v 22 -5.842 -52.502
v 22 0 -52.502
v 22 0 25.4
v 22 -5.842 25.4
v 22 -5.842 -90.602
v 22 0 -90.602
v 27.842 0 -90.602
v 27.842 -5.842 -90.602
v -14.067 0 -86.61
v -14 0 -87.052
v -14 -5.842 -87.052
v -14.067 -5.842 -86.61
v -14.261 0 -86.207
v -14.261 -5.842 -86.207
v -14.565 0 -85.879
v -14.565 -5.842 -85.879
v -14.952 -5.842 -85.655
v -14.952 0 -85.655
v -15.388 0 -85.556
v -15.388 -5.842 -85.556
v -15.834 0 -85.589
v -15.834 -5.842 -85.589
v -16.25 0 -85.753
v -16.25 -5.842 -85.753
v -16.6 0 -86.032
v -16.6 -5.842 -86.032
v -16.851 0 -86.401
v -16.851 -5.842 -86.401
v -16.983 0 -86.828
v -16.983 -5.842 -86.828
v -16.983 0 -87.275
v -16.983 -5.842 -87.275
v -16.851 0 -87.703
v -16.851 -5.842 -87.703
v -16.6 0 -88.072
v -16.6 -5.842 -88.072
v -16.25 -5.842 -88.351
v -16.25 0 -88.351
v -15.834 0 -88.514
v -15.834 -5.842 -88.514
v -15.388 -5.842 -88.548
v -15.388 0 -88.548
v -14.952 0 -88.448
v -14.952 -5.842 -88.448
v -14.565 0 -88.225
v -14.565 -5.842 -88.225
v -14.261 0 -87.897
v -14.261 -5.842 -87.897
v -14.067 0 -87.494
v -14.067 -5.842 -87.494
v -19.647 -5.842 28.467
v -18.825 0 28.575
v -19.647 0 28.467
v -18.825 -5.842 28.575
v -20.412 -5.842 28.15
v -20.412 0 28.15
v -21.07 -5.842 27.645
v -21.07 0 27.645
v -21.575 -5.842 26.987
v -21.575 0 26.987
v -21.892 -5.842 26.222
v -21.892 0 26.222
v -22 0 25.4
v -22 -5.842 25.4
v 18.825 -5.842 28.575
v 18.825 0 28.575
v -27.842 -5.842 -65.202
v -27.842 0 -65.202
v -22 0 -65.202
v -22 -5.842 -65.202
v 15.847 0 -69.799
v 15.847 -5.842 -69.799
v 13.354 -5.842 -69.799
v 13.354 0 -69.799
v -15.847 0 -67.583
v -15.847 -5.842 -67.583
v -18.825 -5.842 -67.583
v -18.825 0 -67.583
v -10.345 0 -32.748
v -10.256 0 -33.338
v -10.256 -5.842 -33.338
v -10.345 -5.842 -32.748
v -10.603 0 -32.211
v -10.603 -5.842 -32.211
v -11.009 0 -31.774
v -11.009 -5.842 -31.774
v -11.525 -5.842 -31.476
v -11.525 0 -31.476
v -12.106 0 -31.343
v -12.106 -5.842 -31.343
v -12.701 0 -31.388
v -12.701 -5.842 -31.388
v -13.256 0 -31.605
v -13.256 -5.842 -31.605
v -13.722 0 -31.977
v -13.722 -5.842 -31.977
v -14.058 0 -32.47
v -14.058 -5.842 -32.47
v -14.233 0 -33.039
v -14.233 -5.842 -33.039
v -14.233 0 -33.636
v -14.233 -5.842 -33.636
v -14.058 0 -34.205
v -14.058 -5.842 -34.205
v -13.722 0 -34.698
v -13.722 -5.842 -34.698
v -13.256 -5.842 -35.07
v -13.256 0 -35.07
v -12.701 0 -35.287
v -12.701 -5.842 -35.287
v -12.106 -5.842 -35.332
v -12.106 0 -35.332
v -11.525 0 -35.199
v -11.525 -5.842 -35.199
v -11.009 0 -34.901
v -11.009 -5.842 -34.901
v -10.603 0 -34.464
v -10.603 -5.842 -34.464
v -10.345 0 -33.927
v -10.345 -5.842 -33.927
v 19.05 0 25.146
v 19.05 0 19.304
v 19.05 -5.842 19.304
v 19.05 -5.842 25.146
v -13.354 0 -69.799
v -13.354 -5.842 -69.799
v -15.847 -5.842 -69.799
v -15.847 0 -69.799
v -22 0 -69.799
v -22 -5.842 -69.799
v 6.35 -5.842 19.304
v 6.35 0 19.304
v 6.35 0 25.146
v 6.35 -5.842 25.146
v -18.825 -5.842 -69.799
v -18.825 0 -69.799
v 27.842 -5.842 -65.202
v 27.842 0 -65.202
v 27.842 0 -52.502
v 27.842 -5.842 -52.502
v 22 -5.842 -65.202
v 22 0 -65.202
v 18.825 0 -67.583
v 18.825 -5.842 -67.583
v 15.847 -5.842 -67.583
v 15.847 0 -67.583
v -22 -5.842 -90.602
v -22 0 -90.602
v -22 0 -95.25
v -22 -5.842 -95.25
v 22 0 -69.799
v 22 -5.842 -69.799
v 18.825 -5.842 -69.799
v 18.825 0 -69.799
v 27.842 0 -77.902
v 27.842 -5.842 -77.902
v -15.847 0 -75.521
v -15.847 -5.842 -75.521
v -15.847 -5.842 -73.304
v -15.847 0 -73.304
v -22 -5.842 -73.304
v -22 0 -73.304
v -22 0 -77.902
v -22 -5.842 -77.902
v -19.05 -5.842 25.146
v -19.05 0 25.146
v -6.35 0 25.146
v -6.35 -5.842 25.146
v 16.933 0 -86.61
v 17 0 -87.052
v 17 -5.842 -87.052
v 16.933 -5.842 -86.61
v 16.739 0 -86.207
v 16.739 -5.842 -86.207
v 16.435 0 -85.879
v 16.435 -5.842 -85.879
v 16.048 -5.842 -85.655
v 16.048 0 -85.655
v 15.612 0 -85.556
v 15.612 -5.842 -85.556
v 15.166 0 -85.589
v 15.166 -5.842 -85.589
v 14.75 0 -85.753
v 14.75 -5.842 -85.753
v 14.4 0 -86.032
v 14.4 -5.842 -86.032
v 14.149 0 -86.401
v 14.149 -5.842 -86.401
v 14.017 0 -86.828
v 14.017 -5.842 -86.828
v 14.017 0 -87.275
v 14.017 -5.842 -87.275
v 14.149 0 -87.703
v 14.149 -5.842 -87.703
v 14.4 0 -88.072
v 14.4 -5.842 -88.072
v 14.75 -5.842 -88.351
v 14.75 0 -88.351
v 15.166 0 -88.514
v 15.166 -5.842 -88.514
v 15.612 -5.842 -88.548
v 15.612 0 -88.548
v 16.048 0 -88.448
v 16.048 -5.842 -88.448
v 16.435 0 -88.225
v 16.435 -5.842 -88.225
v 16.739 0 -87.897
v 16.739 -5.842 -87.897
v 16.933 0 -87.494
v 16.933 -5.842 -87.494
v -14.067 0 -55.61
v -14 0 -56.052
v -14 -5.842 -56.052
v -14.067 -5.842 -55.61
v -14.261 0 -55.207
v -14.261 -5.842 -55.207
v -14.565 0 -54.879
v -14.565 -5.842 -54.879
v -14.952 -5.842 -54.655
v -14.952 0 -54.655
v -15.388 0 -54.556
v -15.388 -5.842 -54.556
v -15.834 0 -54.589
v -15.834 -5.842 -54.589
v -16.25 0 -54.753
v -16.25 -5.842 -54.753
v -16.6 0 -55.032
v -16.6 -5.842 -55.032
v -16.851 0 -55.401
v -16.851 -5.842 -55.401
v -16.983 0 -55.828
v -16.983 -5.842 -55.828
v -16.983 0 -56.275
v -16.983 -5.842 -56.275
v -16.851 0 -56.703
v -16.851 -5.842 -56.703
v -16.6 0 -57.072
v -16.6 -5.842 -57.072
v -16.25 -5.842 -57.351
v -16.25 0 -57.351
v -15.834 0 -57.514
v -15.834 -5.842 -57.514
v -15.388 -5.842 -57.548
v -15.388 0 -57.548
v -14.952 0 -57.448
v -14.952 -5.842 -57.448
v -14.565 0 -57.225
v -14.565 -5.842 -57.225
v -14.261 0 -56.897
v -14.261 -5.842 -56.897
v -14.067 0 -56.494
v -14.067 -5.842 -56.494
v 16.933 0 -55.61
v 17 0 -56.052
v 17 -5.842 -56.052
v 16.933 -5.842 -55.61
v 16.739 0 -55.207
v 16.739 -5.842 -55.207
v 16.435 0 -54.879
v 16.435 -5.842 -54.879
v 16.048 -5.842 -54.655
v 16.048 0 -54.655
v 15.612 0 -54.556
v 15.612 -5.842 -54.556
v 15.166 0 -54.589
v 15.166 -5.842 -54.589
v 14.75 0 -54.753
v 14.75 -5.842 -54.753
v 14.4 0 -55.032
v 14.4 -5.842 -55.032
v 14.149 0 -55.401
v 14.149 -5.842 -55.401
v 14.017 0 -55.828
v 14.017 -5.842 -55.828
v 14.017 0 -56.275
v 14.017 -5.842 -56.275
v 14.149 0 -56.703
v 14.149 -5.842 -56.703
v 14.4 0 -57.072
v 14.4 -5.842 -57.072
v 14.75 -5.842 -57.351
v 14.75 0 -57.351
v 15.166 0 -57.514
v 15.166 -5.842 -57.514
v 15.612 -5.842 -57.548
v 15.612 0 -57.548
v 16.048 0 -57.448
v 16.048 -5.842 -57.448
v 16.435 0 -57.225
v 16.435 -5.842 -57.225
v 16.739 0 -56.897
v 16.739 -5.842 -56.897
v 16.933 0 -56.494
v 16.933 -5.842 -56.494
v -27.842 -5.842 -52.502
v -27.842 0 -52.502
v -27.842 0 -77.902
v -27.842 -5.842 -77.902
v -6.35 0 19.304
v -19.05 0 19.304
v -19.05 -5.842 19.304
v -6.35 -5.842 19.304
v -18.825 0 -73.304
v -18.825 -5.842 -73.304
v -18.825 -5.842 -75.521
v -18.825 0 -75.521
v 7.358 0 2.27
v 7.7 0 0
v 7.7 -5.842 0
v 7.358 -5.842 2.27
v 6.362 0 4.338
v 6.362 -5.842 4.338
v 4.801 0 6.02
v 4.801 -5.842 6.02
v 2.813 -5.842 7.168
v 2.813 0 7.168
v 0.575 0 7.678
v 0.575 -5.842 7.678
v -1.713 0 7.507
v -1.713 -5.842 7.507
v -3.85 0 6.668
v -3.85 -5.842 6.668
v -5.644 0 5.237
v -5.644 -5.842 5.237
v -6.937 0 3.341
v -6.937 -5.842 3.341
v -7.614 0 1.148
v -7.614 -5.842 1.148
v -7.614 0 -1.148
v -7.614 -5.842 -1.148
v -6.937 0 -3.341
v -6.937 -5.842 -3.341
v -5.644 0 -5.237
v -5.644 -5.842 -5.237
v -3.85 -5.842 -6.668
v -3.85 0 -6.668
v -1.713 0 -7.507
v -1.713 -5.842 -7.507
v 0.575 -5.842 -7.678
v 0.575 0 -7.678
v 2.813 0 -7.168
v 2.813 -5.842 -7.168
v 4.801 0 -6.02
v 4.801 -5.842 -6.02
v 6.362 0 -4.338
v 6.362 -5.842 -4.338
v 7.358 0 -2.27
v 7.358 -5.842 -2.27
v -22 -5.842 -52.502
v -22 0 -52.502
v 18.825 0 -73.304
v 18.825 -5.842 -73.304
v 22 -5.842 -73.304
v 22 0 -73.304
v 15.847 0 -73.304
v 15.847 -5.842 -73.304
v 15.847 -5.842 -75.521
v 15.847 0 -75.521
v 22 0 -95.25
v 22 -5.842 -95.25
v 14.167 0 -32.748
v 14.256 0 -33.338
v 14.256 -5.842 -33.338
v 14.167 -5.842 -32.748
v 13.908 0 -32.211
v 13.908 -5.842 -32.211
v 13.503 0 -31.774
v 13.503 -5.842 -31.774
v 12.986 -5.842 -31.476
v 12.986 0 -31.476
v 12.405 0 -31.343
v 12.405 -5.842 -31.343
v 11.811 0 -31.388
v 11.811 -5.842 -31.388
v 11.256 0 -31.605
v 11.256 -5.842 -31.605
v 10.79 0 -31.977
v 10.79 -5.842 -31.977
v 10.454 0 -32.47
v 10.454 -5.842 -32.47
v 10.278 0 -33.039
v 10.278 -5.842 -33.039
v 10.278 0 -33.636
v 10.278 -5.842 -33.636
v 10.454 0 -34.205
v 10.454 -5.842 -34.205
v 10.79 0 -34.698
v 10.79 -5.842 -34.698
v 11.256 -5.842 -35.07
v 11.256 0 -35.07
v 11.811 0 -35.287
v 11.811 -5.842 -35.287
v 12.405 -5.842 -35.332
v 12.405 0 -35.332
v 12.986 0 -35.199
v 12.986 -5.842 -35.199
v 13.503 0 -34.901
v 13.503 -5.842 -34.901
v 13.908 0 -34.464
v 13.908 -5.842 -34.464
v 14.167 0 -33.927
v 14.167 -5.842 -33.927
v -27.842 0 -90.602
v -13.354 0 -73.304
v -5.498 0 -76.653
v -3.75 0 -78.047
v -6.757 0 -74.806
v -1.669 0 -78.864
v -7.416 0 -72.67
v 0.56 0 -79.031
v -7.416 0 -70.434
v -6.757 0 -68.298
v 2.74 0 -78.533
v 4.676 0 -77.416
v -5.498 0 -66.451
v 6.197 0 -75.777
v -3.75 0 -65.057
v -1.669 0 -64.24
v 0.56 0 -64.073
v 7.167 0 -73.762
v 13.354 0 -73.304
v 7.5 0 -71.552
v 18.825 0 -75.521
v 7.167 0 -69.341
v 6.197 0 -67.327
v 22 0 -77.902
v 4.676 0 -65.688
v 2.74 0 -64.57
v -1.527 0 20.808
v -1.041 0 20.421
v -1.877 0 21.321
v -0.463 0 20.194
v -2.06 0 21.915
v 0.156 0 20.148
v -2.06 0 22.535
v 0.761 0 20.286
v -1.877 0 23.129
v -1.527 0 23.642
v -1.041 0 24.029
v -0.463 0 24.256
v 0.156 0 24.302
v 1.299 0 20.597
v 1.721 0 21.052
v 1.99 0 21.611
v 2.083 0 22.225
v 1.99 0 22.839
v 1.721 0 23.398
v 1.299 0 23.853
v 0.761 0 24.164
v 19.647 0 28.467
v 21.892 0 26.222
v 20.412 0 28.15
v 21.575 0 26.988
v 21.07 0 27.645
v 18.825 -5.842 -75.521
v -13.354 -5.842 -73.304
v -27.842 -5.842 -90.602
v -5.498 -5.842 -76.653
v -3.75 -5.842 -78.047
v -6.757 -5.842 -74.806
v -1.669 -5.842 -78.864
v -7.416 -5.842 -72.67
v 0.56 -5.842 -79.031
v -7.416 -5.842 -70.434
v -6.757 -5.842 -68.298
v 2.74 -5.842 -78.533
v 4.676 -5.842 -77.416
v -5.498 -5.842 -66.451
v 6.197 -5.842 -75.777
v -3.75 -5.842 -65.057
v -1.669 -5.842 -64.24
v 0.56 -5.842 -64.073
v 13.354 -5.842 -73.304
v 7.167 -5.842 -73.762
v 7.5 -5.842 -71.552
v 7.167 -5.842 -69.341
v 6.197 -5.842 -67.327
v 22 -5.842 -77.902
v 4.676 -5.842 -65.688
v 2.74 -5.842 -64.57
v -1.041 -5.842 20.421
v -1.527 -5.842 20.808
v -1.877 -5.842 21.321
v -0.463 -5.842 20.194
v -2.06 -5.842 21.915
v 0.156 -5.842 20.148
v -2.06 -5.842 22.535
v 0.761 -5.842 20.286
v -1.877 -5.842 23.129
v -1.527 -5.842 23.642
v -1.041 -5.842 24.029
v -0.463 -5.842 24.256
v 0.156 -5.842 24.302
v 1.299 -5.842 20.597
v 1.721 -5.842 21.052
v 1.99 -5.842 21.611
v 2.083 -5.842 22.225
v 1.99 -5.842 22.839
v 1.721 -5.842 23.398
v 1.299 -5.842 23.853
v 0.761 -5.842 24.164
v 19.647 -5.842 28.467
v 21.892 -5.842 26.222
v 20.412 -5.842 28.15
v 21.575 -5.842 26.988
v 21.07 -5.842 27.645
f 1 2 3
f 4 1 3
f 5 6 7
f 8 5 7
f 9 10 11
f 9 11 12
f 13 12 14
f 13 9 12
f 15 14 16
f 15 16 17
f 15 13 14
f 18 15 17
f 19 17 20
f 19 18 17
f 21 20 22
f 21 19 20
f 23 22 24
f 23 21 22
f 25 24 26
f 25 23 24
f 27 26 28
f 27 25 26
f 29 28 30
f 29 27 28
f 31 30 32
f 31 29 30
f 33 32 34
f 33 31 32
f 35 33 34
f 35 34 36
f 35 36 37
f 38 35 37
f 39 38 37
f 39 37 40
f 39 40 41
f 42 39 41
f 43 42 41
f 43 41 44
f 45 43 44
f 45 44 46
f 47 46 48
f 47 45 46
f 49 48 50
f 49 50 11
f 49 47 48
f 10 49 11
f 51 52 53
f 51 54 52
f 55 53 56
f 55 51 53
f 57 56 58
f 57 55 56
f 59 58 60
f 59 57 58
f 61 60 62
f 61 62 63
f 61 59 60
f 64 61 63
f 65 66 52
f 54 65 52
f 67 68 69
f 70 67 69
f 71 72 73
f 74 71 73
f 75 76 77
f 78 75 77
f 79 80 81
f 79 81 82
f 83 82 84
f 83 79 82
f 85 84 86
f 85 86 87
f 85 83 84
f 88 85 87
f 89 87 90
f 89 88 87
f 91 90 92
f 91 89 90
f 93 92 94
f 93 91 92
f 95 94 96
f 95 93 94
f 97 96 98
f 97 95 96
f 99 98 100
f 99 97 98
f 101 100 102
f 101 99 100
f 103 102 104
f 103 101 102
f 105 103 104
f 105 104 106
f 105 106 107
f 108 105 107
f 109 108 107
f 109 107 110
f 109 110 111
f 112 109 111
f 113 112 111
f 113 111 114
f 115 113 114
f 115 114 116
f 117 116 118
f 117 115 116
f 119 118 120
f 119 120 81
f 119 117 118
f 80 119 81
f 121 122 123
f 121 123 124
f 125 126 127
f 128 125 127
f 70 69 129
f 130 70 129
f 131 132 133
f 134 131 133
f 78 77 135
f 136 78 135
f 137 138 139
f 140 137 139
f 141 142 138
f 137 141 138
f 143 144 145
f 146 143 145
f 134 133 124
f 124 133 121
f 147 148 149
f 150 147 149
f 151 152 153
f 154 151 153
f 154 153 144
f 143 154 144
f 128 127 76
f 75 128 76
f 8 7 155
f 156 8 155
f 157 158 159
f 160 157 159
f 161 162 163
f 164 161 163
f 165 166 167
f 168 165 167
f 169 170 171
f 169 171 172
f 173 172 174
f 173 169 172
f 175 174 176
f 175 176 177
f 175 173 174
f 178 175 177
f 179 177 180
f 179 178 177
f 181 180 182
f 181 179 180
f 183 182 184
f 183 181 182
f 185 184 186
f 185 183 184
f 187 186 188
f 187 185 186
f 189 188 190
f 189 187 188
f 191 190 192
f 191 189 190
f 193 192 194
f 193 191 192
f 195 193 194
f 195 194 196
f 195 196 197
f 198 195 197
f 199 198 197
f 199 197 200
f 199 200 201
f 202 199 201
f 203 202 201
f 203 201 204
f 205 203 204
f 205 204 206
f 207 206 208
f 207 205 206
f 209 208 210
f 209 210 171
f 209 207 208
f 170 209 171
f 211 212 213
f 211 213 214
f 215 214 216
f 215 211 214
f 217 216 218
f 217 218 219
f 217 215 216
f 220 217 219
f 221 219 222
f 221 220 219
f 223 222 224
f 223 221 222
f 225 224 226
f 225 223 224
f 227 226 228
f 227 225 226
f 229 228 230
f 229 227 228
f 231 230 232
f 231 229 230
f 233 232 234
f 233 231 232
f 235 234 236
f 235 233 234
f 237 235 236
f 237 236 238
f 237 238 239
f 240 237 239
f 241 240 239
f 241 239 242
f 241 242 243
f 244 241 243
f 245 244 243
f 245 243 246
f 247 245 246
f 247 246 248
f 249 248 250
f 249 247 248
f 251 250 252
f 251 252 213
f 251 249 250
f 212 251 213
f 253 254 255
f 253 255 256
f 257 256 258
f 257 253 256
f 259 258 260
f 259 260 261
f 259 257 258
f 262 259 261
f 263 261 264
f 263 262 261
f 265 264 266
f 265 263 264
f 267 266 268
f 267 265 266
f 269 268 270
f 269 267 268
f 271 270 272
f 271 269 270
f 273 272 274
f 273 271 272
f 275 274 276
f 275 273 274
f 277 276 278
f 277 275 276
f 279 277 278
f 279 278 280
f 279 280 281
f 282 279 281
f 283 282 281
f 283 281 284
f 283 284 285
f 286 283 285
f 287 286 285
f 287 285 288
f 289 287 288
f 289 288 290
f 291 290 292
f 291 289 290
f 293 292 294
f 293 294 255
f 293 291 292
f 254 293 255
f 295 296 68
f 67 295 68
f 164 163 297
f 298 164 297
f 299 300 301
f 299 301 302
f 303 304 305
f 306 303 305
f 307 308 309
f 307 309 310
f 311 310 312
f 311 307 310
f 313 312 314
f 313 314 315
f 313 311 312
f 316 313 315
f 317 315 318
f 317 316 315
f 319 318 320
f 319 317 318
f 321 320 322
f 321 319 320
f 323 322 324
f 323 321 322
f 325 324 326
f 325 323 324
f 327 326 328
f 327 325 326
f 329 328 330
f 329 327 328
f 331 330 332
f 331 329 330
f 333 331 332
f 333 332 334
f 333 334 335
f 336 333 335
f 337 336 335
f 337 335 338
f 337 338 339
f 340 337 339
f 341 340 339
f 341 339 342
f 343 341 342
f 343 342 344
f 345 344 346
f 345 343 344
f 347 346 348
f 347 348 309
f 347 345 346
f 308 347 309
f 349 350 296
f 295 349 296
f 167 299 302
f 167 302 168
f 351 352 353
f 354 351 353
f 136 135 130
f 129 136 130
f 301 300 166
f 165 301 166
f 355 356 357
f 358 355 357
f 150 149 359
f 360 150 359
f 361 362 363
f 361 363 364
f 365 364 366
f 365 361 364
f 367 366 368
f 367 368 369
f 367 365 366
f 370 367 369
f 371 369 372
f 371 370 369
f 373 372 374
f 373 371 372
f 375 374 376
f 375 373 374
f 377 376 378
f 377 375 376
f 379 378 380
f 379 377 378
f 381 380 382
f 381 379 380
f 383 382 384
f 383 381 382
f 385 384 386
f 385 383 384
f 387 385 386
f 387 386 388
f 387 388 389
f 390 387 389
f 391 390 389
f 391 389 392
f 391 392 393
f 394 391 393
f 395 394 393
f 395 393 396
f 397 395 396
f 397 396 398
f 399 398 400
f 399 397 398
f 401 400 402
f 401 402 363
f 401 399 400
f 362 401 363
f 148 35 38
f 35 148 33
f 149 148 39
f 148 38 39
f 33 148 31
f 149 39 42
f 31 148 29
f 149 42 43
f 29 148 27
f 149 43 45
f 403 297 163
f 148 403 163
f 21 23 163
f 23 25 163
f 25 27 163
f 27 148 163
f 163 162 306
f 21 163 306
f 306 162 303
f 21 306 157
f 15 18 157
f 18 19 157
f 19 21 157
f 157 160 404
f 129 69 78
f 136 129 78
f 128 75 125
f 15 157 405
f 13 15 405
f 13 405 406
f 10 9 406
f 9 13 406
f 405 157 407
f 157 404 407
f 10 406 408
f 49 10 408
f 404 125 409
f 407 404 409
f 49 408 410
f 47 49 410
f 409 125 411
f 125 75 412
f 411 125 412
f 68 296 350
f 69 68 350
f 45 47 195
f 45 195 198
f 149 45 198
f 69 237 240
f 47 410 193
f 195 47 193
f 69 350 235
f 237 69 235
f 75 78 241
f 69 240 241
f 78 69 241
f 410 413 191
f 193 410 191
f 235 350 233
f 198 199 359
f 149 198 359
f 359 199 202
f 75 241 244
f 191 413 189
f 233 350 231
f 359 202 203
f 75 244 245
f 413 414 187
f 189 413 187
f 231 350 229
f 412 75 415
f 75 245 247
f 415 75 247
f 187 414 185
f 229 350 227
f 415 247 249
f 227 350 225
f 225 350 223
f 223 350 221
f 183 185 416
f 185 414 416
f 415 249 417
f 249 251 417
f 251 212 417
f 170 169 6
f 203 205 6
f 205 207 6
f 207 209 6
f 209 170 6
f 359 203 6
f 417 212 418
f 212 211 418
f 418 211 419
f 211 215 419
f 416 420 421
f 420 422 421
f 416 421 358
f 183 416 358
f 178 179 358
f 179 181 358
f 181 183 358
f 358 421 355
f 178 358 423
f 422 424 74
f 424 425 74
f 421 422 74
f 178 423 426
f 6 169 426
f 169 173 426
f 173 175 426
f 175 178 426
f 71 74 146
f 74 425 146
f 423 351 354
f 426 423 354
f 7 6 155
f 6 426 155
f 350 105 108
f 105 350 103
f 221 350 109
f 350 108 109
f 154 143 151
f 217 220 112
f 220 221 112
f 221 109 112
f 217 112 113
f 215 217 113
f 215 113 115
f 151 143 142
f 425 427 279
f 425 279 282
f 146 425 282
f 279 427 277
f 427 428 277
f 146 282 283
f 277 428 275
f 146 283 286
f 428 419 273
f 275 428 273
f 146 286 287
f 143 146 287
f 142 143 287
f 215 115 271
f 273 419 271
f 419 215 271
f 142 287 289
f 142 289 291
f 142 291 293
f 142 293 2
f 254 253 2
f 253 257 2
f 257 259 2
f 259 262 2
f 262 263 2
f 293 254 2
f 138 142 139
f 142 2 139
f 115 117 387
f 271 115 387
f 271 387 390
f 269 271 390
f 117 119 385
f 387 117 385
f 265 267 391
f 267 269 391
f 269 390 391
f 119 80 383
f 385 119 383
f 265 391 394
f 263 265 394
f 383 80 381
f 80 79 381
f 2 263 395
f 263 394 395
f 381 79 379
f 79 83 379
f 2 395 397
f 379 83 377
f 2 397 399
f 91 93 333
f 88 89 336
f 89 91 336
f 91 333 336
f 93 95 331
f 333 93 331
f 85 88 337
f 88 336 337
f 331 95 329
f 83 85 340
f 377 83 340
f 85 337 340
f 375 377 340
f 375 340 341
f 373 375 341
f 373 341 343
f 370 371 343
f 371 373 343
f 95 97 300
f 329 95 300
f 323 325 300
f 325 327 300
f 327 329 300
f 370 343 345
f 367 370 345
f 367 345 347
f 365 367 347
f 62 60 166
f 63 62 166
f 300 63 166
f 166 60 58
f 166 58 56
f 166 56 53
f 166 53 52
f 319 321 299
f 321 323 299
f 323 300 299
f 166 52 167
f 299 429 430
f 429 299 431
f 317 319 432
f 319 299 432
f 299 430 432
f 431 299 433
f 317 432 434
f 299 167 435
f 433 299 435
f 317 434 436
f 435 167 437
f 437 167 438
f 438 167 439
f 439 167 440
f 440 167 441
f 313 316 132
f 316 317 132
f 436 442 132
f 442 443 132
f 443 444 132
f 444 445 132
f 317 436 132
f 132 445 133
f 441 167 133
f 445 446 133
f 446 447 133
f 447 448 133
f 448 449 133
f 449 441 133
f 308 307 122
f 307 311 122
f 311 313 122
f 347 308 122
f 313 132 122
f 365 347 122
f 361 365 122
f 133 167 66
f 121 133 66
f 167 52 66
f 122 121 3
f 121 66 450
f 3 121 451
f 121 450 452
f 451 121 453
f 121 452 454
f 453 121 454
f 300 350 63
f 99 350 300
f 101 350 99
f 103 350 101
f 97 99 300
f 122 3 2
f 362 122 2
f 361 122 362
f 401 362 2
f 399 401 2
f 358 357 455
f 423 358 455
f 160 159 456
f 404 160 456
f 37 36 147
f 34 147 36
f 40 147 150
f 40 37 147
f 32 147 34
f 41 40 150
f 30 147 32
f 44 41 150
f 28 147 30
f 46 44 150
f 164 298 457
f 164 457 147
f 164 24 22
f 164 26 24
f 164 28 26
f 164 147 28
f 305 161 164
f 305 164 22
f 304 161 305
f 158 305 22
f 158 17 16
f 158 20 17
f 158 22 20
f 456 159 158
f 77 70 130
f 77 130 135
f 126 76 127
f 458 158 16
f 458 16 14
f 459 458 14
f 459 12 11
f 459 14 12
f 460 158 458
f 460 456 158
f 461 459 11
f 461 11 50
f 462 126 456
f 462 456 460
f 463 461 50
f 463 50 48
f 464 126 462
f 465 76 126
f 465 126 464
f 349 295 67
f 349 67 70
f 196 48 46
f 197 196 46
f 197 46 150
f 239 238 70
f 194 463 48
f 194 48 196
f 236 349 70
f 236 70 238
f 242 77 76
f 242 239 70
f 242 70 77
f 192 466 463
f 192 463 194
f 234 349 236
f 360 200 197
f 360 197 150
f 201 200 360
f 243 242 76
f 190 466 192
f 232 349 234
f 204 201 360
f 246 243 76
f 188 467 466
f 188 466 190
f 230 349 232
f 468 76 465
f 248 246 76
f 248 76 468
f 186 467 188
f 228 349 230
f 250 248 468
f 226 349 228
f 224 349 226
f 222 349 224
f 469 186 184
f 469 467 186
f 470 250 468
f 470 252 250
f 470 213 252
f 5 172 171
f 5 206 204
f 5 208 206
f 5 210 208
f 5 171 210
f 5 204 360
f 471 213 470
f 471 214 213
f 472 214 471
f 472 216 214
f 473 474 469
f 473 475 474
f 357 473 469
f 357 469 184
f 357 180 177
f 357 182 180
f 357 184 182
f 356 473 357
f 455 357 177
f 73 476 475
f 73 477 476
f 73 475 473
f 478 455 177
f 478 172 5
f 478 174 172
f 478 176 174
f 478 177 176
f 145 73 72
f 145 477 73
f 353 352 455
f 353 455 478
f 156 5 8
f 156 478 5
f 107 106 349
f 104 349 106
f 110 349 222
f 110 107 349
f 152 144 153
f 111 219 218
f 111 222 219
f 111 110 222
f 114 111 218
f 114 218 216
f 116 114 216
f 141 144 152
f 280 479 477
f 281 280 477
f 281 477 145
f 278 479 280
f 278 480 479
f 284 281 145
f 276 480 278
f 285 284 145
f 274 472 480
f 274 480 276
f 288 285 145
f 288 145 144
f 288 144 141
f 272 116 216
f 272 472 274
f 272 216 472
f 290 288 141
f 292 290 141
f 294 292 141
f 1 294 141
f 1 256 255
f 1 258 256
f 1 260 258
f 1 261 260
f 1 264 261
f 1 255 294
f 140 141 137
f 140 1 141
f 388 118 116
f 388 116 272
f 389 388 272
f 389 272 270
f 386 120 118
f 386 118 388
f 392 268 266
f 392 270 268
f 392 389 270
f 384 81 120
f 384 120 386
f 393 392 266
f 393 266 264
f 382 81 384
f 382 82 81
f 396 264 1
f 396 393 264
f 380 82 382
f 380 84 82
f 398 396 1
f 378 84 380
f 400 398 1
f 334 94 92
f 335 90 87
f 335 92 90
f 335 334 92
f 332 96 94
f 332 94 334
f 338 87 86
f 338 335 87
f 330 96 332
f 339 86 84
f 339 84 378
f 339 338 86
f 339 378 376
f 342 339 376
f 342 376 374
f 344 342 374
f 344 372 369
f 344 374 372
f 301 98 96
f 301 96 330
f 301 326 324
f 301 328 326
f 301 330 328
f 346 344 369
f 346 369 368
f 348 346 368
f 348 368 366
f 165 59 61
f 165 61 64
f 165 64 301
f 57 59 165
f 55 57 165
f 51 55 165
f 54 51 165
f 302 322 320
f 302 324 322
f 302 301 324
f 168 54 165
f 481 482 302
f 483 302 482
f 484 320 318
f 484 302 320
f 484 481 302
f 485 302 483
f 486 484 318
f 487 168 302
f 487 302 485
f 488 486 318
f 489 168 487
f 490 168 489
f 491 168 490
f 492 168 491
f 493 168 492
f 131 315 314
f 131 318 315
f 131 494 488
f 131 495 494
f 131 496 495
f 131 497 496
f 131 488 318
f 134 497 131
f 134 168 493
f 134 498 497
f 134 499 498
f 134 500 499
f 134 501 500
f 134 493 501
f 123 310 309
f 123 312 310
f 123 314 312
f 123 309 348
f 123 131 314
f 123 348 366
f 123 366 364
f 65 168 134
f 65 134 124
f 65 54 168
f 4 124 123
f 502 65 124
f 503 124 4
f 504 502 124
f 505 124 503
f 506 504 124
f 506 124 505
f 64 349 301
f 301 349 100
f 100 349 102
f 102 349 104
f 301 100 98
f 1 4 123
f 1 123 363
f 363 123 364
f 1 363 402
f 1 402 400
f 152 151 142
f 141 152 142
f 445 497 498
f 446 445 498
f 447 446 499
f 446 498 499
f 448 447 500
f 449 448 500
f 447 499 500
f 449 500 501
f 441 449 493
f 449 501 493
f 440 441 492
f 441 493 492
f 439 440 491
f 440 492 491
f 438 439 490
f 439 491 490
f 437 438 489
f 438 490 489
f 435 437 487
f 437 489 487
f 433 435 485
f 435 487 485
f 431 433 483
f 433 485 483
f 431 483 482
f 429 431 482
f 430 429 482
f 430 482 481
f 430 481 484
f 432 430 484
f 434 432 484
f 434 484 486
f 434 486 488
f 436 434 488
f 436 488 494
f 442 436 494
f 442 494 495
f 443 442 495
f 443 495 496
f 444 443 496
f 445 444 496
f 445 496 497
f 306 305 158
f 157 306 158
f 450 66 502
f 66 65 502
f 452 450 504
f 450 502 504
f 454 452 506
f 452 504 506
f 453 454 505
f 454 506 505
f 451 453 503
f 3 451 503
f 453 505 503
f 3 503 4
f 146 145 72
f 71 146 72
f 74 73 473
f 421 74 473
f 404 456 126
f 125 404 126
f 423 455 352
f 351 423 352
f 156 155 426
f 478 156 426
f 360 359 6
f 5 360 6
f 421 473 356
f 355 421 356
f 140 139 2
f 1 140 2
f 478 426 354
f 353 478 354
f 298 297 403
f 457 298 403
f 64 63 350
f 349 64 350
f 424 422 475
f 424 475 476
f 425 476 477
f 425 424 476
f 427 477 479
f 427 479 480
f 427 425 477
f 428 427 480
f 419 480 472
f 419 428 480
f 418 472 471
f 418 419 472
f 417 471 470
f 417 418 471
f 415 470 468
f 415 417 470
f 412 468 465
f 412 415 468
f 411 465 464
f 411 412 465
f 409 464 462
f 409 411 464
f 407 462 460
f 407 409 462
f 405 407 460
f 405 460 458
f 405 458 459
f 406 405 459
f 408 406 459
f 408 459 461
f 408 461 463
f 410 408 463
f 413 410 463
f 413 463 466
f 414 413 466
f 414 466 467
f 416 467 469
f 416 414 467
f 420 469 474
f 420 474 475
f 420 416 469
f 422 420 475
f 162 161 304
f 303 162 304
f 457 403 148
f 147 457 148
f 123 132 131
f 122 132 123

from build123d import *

# Parameters (mm, degrees)
F0_R     = 1.5
F0_R_2   = 7.5
F0_R_3   = 2
F0_W     = 12.7
F0_H     = 5.842
F0_R_4   = 7.7
F1_DEPTH = 5.842
F2_R     = 3.175
F4_DEPTH = 5.843
F5_R     = 2.0828
F6_DEPTH = 25.4


with BuildPart() as f1:
    # F0 (on Front) → F1 (new body)
    with BuildSketch(Plane.XZ):
        Polygon((22, 28.575), (-22, 28.575), (-22, -52.5018), (-27.842, -52.5018), (-27.842, -65.2018), (-22, -65.2018), (-22, -77.9018), (-27.842, -77.9018), (-27.842, -90.6018), (-22, -90.6018), (-22, -95.25), (22, -95.25), (22, -90.6018), (27.842, -90.6018), (27.842, -77.9018), (22, -77.9018), (22, -65.2018), (27.842, -65.2018), (27.842, -52.5018), (22, -52.5018), align=None)
        with Locations((-15.5, -87.0518)):
            Circle(F0_R, mode=Mode.SUBTRACT)
        with Locations((-15.5, -56.0518)):
            Circle(F0_R, mode=Mode.SUBTRACT)
        with Locations((0, -71.5518)):
            Circle(F0_R_2, mode=Mode.SUBTRACT)
        with Locations((15.5, -87.0518)):
            Circle(F0_R, mode=Mode.SUBTRACT)
        with Locations((15.5, -56.0518)):
            Circle(F0_R, mode=Mode.SUBTRACT)
        with Locations((-12.255778, -33.3375)):
            Circle(F0_R_3, mode=Mode.SUBTRACT)
        with Locations((-12.7, 22.225)):
            Rectangle(F0_W, F0_H, mode=Mode.SUBTRACT)
        with Locations((12.255778, -33.3375)):
            Circle(F0_R_3, mode=Mode.SUBTRACT)
        Circle(F0_R_4, mode=Mode.SUBTRACT)
        with Locations((12.7, 22.225)):
            Rectangle(F0_W, F0_H, mode=Mode.SUBTRACT)
    extrude(amount=F1_DEPTH)

    # F2
    f2_edges = [f1.edges().sort_by_distance(p)[0] for p in [
        (-22, -2.921, 28.575),
        (22, -2.921, 28.575),
    ]]
    fillet(f2_edges, radius=F2_R)

    # F3 (on face) → F4 (cut, through all)
    with BuildSketch(Plane.XZ.offset(5.842)):
        Polygon((-18.825, -69.7992), (-22, -69.7992), (-22, -73.3044), (-18.825, -73.3044), (-18.825, -75.52055), (-15.846875, -75.52055), (-15.846875, -73.3044), (-13.3545, -73.3044), (-13.3545, -69.7992), (-15.846875, -69.7992), (-15.846875, -67.58305), (-18.825, -67.58305), align=None)
        Polygon((22, -73.3044), (22, -69.7992), (18.825, -69.7992), (18.825, -67.58305), (15.846875, -67.58305), (15.846875, -69.7992), (13.3545, -69.7992), (13.3545, -73.3044), (15.846875, -73.3044), (15.846875, -75.52055), (18.825, -75.52055), (18.825, -73.3044), align=None)
    extrude(amount=-F4_DEPTH, mode=Mode.SUBTRACT)

    # F5 (on face) → F6 (cut)
    with BuildSketch(Plane.XZ.offset(5.842)):
        with Locations((0, 22.225)):
            Circle(F5_R)
    extrude(amount=-F6_DEPTH, mode=Mode.SUBTRACT)


solid = f1.part
